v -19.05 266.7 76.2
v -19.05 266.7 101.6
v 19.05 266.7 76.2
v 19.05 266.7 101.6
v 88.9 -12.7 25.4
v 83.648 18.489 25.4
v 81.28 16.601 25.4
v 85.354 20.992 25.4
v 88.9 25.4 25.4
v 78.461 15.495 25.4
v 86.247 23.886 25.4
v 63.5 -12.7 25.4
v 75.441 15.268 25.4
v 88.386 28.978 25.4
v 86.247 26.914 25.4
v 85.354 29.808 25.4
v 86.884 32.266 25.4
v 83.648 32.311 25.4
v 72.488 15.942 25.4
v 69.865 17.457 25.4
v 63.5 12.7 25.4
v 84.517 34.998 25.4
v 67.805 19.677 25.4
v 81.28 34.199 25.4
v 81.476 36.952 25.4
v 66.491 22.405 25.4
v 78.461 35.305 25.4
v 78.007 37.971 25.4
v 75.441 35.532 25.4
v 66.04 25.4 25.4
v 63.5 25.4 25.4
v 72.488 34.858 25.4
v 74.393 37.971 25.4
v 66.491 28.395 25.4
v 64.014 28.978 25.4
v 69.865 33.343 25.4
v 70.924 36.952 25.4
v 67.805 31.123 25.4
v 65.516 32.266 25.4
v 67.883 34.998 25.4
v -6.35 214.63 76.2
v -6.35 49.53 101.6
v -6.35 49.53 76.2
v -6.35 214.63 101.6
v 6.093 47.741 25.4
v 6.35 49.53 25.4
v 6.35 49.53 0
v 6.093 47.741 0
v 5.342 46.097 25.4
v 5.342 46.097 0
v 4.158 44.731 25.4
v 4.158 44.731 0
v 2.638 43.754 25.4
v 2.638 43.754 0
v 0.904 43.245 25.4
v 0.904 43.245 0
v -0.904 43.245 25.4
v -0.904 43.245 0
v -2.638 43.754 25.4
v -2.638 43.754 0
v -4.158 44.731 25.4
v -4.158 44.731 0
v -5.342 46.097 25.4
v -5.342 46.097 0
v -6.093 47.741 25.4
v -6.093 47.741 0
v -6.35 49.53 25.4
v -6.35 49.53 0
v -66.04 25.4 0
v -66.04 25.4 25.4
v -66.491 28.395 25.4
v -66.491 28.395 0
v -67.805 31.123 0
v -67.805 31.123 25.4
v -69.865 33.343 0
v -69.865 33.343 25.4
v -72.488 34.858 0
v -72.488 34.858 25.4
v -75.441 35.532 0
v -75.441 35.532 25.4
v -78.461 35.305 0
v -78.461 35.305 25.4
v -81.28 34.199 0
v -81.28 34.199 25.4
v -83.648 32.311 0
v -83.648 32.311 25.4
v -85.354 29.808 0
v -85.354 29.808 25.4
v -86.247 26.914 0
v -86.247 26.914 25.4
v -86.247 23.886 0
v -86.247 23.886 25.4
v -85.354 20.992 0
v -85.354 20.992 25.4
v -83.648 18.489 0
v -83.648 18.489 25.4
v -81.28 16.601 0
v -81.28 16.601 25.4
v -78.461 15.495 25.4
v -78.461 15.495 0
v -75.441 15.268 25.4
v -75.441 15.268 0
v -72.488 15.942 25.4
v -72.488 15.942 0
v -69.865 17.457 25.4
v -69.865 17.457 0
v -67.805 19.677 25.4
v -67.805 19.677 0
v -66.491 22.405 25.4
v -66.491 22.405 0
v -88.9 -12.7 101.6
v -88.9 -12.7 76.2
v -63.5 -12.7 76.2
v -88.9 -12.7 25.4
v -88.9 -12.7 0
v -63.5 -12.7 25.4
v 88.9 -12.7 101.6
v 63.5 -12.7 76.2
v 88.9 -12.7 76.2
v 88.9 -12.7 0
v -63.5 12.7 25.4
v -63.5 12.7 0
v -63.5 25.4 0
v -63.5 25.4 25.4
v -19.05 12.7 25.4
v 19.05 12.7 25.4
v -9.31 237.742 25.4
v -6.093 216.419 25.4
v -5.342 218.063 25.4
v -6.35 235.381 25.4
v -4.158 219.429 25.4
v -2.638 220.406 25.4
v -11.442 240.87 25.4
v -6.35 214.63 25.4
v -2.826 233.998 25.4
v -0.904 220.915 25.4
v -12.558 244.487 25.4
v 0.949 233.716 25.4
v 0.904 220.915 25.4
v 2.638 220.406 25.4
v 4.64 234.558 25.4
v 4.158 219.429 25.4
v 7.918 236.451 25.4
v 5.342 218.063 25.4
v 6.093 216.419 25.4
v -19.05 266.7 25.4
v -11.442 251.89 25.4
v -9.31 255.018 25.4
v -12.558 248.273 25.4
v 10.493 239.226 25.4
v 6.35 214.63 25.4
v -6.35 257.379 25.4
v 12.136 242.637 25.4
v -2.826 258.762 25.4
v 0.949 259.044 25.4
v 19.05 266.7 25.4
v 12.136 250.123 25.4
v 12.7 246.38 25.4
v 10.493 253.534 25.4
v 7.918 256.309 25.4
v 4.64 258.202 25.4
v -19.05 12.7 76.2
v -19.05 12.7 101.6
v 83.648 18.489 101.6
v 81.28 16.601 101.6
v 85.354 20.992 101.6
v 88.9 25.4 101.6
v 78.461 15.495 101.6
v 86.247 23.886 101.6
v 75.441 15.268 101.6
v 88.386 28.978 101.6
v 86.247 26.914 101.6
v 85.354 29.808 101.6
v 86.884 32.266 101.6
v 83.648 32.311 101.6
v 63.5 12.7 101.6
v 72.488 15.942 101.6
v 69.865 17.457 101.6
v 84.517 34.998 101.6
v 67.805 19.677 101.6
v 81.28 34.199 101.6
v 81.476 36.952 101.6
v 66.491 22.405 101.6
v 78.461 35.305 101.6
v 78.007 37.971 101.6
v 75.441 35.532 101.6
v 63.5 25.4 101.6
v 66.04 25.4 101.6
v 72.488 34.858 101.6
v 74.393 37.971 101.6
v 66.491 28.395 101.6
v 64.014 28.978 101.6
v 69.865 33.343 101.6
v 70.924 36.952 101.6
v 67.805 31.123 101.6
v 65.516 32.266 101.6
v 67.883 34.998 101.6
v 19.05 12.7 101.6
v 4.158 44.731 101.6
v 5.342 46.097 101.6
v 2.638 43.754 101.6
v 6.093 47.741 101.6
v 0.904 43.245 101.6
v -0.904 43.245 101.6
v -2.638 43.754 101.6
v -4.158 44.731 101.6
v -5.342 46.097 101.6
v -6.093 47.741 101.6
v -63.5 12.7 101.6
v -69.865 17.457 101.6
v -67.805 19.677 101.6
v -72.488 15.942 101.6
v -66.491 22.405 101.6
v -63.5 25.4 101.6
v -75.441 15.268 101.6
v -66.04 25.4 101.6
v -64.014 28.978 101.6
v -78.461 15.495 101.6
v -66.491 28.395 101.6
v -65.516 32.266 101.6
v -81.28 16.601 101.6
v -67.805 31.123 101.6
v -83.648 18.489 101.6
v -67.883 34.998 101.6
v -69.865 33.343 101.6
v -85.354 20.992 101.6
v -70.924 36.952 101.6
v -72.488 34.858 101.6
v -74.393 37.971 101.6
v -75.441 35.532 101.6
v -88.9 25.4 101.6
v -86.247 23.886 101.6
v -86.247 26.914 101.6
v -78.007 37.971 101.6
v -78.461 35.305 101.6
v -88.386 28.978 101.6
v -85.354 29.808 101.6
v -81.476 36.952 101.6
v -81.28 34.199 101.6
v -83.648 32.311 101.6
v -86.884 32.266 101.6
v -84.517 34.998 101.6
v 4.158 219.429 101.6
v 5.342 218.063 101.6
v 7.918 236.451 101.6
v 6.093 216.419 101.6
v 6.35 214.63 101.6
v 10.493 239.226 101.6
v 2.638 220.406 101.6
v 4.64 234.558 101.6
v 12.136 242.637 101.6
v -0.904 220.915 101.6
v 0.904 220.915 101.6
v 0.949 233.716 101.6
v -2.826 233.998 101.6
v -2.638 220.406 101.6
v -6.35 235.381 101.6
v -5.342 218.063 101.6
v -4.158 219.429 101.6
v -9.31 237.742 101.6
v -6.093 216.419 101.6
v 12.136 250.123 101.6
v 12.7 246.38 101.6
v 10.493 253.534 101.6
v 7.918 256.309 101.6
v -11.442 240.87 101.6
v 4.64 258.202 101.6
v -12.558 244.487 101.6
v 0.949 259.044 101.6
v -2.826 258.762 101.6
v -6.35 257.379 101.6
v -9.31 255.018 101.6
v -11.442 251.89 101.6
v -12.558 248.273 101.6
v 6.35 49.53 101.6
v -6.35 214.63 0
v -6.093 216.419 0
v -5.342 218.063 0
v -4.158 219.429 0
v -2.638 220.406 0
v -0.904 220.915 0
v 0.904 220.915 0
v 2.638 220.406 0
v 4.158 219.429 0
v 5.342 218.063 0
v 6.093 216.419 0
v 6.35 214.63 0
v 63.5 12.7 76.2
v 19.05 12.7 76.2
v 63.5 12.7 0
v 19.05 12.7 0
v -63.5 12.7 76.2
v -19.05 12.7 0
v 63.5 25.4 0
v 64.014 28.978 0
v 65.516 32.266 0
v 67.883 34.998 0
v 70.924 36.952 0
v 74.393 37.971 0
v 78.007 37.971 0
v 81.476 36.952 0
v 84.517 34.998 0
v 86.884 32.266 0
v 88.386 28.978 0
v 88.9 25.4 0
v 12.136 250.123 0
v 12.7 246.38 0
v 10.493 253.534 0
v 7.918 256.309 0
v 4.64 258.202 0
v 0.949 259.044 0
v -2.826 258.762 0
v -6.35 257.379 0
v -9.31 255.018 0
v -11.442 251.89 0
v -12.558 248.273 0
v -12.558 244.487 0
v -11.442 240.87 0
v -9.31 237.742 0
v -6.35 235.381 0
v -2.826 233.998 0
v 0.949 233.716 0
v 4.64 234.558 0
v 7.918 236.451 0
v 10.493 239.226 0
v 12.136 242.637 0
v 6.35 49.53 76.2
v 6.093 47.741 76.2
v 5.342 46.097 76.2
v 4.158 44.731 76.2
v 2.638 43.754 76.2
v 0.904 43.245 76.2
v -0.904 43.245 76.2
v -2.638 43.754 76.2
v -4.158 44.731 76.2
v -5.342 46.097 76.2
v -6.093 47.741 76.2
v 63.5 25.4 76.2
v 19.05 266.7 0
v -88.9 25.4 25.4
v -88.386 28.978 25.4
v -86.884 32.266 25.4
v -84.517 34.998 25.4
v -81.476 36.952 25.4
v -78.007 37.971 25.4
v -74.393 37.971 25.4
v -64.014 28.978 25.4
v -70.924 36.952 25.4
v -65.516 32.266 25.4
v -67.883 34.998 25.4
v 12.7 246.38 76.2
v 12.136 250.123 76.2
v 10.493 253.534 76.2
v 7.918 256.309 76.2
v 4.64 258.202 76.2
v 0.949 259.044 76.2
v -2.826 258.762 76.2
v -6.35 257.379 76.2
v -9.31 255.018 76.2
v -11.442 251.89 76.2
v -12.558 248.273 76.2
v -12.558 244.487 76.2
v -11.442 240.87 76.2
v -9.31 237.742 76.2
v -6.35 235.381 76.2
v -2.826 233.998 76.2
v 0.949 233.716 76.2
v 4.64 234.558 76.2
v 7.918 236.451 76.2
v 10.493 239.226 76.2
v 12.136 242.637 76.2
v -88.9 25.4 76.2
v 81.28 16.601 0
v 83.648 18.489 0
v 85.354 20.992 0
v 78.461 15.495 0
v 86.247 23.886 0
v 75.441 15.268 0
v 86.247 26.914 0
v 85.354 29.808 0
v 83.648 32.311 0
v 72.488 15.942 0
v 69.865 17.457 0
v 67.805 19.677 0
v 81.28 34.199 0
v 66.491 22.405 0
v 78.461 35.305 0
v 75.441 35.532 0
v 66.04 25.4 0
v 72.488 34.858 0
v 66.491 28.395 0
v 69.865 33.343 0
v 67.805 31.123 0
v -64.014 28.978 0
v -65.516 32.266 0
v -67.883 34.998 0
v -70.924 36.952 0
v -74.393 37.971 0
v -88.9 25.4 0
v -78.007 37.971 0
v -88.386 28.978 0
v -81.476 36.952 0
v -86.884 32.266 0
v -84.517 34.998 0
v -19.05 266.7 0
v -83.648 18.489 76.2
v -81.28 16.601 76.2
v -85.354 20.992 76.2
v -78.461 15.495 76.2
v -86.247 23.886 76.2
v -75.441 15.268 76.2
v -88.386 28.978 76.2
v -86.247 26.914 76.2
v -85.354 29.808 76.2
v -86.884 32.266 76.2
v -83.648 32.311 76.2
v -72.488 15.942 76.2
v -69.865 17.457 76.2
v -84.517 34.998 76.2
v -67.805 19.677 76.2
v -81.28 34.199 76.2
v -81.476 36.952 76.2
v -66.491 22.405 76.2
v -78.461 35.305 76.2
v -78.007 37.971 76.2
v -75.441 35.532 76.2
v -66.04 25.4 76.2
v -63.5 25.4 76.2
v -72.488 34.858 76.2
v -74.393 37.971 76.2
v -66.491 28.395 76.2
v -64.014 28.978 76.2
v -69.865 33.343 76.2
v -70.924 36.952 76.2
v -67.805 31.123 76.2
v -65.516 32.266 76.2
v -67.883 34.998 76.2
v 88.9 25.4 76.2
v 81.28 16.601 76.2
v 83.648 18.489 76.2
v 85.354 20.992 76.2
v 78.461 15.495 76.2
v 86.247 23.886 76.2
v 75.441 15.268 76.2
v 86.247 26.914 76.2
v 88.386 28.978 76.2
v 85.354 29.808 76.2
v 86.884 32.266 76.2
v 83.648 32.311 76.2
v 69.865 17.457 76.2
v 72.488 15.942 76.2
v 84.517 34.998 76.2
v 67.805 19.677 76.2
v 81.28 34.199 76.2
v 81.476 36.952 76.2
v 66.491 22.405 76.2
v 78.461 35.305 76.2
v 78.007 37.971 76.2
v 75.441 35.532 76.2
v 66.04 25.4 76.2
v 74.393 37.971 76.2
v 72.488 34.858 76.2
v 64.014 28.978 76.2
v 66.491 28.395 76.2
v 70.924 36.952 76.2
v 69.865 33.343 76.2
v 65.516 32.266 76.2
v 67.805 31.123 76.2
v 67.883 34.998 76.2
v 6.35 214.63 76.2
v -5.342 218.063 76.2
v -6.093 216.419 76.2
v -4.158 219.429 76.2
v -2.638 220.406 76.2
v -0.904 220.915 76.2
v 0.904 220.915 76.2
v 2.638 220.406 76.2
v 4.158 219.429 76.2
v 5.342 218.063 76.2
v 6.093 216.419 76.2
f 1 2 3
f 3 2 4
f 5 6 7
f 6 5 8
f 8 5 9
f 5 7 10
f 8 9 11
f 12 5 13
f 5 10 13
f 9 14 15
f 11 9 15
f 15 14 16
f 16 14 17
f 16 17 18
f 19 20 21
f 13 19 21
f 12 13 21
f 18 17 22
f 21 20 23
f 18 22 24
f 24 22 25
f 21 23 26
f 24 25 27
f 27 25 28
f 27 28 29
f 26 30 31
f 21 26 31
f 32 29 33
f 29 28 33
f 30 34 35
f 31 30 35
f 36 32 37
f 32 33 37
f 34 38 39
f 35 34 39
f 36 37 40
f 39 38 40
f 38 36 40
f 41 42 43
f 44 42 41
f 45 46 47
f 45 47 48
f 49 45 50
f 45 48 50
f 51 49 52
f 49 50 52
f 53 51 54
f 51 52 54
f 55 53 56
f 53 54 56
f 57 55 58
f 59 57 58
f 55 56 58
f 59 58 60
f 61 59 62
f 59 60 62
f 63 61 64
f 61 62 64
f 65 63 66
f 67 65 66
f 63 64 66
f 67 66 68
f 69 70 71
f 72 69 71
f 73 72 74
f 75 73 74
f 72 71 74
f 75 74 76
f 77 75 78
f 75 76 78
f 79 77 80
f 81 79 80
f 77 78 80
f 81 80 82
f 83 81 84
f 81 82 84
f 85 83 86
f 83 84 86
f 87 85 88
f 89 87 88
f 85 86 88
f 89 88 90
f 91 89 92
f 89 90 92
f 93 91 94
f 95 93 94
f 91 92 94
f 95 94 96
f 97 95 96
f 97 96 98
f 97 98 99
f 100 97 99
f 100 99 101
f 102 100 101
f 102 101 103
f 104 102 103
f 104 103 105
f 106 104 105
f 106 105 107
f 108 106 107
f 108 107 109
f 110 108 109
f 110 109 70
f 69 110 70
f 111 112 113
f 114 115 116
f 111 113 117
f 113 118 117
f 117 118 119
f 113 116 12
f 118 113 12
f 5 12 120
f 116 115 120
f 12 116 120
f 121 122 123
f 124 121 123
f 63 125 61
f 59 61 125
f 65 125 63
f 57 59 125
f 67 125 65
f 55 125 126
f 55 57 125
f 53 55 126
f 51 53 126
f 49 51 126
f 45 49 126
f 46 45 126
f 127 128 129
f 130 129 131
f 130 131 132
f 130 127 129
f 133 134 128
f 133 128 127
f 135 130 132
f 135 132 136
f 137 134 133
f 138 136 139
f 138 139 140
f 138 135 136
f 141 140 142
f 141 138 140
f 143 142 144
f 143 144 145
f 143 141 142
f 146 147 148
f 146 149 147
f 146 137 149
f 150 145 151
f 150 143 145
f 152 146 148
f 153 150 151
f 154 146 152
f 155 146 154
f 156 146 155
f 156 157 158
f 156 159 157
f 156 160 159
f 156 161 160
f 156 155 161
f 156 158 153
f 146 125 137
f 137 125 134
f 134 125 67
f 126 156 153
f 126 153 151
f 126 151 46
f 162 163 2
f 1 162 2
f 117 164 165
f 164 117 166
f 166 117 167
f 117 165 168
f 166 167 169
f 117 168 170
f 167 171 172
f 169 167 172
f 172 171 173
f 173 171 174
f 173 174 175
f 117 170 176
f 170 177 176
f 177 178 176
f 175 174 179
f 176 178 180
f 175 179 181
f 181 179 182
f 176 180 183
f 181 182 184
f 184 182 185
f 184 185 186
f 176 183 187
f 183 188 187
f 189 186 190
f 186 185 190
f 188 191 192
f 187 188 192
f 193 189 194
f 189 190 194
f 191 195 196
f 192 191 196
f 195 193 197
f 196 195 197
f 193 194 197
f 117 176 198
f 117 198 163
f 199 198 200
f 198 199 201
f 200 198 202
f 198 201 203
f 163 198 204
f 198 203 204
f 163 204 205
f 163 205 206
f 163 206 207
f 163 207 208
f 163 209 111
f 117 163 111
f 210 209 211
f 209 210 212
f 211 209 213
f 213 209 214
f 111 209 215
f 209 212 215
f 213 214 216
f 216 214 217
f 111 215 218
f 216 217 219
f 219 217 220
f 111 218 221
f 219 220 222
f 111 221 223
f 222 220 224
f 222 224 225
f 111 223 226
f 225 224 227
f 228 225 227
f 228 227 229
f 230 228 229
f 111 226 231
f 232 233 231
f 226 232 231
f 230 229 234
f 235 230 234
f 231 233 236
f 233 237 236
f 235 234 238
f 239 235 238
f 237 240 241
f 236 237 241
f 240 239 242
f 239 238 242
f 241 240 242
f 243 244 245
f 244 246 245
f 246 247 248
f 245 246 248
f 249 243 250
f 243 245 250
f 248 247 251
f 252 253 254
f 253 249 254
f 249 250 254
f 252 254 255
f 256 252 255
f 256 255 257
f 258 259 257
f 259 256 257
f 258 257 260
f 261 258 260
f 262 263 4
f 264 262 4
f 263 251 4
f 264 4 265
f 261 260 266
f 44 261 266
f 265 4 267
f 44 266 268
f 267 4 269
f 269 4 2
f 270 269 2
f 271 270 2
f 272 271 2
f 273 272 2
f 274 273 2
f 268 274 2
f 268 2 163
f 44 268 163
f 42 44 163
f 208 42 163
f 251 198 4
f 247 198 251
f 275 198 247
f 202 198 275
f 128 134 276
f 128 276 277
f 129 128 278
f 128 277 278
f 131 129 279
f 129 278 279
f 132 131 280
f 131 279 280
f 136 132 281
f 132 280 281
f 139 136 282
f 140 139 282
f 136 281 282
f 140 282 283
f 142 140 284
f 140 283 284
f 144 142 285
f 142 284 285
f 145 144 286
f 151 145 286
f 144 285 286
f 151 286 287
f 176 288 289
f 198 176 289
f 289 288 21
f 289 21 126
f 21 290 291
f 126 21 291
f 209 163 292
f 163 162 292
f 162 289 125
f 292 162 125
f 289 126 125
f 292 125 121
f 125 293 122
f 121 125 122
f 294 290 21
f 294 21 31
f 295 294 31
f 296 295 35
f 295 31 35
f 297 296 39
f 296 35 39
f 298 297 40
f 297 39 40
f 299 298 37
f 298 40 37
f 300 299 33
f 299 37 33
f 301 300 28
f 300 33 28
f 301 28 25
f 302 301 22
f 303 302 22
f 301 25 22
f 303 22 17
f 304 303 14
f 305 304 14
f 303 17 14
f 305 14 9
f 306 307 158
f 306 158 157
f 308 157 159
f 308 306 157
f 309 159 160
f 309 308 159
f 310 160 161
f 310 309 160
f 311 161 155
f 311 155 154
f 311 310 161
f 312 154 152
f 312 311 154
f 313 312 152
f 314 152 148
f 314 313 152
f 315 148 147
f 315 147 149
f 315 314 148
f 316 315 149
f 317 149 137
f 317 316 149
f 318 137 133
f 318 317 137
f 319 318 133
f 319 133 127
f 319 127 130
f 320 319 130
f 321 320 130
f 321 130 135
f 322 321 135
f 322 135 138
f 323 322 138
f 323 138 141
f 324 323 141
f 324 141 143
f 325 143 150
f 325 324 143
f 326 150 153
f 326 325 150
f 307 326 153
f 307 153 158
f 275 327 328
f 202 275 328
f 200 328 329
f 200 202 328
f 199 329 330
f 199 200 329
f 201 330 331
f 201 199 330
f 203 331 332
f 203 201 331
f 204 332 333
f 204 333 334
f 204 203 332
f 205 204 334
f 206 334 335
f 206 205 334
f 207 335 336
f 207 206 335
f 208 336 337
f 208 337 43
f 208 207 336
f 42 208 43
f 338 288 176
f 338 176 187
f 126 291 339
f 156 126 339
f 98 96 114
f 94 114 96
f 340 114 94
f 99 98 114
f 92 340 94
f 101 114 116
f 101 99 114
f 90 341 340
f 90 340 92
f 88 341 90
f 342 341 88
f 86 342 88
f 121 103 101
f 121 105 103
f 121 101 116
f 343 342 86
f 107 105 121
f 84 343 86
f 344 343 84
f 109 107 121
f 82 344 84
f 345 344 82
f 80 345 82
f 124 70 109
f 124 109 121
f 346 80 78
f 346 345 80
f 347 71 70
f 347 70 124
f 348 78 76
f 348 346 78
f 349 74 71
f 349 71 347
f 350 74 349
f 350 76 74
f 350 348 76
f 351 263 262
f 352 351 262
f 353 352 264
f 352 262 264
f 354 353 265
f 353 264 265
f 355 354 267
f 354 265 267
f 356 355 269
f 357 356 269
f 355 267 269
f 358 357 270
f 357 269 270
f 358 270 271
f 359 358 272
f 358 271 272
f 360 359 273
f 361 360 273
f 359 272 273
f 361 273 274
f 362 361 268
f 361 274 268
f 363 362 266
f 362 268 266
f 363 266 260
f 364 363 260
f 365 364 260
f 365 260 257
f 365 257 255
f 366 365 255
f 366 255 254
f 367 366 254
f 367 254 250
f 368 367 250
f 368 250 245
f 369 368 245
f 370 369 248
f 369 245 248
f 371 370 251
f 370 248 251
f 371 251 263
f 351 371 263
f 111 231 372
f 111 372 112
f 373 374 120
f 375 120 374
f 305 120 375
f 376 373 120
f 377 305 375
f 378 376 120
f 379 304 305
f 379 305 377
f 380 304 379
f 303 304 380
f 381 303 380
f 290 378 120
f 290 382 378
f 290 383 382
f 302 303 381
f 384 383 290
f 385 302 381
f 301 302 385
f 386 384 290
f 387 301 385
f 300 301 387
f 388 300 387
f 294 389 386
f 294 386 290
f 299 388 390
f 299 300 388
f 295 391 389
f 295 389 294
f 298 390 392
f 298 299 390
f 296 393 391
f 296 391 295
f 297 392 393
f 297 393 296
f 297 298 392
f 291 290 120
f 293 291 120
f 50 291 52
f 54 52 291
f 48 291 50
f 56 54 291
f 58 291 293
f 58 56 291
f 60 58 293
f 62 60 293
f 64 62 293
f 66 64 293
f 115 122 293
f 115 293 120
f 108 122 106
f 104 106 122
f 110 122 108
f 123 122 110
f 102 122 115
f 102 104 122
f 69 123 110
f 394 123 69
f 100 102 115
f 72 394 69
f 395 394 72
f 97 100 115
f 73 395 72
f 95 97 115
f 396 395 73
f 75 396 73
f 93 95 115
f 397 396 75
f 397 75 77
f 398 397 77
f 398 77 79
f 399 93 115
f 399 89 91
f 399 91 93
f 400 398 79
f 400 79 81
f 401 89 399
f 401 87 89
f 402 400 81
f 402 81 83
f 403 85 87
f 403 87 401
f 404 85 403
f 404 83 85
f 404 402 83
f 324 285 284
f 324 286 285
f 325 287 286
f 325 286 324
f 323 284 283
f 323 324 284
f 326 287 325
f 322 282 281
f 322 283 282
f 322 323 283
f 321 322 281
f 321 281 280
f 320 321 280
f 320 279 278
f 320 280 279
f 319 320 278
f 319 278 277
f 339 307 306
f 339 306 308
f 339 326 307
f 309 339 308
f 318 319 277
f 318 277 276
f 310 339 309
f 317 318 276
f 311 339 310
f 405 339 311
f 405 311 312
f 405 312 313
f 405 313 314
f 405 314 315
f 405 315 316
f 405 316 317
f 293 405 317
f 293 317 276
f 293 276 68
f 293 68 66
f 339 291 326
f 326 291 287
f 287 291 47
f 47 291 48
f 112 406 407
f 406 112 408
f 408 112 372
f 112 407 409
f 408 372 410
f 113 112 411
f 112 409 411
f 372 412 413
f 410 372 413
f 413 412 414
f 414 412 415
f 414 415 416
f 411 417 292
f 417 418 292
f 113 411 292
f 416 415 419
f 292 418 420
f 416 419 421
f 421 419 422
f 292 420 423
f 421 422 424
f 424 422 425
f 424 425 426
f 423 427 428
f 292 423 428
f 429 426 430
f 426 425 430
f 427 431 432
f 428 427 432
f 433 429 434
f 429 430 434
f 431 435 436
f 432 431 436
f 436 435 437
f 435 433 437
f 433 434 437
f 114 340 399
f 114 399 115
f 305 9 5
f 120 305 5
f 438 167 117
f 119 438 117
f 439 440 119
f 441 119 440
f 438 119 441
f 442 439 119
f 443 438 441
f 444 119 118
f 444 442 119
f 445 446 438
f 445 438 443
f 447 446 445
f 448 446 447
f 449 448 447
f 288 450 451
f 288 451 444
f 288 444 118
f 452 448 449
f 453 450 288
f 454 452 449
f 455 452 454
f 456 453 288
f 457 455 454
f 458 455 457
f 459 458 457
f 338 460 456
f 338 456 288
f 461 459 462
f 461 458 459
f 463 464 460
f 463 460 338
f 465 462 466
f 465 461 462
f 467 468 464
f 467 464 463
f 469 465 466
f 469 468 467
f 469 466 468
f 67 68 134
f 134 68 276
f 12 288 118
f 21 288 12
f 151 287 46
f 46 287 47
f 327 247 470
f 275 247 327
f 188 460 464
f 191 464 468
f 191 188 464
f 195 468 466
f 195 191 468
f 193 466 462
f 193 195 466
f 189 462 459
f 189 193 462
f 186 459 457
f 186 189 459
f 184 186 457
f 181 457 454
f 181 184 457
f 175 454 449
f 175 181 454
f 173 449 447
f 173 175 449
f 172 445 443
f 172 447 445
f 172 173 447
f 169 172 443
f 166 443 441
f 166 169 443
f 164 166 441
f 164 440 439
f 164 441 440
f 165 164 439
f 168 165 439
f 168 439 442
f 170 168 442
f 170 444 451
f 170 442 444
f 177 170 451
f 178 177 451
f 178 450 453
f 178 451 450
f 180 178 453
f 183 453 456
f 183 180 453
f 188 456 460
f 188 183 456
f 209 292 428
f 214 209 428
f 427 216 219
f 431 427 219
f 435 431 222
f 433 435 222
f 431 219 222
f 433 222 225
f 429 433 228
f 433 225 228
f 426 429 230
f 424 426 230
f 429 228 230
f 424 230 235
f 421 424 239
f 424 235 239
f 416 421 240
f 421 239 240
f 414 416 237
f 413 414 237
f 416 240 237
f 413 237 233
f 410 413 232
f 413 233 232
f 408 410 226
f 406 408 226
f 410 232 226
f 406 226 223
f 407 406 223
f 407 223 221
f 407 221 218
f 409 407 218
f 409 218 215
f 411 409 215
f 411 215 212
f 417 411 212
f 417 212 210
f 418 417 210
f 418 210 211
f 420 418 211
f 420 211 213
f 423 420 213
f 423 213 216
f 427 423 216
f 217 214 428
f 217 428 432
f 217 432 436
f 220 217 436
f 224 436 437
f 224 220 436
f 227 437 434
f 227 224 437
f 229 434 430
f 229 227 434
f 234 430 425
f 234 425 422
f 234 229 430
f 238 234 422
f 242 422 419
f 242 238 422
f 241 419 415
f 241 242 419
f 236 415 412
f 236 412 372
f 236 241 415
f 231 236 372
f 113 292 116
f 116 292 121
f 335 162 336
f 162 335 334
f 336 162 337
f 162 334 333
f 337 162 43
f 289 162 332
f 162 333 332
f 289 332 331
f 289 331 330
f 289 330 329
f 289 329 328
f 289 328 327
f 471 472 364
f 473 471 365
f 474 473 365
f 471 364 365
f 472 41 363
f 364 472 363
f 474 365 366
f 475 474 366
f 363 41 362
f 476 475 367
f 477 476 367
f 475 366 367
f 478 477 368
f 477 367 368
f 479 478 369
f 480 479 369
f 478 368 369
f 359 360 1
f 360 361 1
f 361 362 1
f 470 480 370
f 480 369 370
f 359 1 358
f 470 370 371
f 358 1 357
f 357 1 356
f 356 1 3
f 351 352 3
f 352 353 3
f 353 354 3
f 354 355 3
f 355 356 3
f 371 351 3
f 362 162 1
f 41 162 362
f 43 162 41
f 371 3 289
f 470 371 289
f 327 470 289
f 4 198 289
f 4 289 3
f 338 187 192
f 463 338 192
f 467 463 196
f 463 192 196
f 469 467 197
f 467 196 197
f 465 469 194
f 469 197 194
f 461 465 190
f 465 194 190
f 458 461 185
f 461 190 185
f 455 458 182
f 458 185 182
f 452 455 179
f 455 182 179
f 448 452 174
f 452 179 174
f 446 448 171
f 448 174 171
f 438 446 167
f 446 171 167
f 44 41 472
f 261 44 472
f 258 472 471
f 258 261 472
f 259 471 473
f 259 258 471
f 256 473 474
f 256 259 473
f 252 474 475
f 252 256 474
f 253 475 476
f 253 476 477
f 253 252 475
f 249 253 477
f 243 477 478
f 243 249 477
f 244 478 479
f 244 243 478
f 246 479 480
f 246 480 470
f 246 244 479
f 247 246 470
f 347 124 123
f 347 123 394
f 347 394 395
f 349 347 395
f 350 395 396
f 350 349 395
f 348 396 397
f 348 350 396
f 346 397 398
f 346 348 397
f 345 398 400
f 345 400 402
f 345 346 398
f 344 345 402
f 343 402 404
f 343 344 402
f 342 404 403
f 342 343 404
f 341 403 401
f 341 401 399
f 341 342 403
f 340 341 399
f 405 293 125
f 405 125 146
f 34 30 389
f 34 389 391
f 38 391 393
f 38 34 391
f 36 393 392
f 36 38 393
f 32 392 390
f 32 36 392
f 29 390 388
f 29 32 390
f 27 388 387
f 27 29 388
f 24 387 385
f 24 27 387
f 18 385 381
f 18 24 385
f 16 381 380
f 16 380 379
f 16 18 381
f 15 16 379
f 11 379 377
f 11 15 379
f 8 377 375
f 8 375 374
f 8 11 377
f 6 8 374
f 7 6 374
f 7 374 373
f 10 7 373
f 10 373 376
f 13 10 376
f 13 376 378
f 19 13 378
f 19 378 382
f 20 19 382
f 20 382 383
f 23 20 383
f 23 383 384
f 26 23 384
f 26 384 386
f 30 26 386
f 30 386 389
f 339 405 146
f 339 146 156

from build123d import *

# Parameters (mm, degrees)
SKETCH1_W           = 38.1
SKETCH1_H           = 254
SKETCH1_R           = 12.7
BOSS_EXTRUDE1_DEPTH = 25.4
SKETCH1_4_W         = 177.8
SKETCH1_4_H         = 25.4
BOSS_EXTRUDE2_DEPTH = 101.6
BOSS_EXTRUDE3_START = 101.6
SKETCH1_5_W         = 38.1
SKETCH1_5_H         = 254
SKETCH1_5_R         = 12.7
BOSS_EXTRUDE3_DEPTH = 25.4
SKETCH2_R           = 12.7
SKETCH2_R_2         = 10.16
BOSS_EXTRUDE4_DEPTH = 101.6
SKETCH3_W           = 25.4
SKETCH3_H           = 50.8
CUT_EXTRUDE1_DEPTH  = 288.648691984


with BuildPart() as part:
    # Sketch1 → Boss-Extrude1 (new body)
    with BuildSketch(Plane.XY):
        Polygon((-88.9, -12.7), (88.9, -12.7), (88.9, 12.7), (19.05, 12.7), (-19.05, 12.7), (-88.9, 12.7), align=None)
        with Locations((0, 139.7)):
            Rectangle(SKETCH1_W, SKETCH1_H)
        with BuildLine():
            ThreePointArc((6.35, 49.53), (0, 43.18), (-6.35, 49.53))
            Line((-6.35, 49.53), (-6.35, 214.63))
            ThreePointArc((-6.35, 214.63), (0, 220.98), (6.35, 214.63))
            Line((6.35, 214.63), (6.35, 49.53))
        make_face(mode=Mode.SUBTRACT)
        with Locations((0, 246.38)):
            Circle(SKETCH1_R, mode=Mode.SUBTRACT)
    extrude(amount=BOSS_EXTRUDE1_DEPTH)

    # Sketch1<4> → Boss-Extrude2 (add)
    with BuildSketch(Plane.XY):
        Rectangle(SKETCH1_4_W, SKETCH1_4_H)
    extrude(amount=BOSS_EXTRUDE2_DEPTH)

    # Sketch1<5> → Boss-Extrude3 (add)
    with BuildSketch(Plane.XY.offset(BOSS_EXTRUDE3_START)):
        Polygon((-88.9, -12.7), (88.9, -12.7), (88.9, 12.7), (19.05, 12.7), (-19.05, 12.7), (-88.9, 12.7), align=None)
        with Locations((0, 139.7)):
            Rectangle(SKETCH1_5_W, SKETCH1_5_H)
        with BuildLine():
            ThreePointArc((6.35, 49.53), (0, 43.18), (-6.35, 49.53))
            Line((-6.35, 49.53), (-6.35, 214.63))
            ThreePointArc((-6.35, 214.63), (0, 220.98), (6.35, 214.63))
            Line((6.35, 214.63), (6.35, 49.53))
        make_face(mode=Mode.SUBTRACT)
        with Locations((0, 246.38)):
            Circle(SKETCH1_5_R, mode=Mode.SUBTRACT)
    extrude(amount=-BOSS_EXTRUDE3_DEPTH)

    # Sketch2 → Boss-Extrude4 (add, through all)
    with BuildSketch(Plane.XY.offset(101.6)):
        with Locations((-76.2, 25.4)):
            Circle(SKETCH2_R)
        with Locations((-76.2, 25.4)):
            Circle(SKETCH2_R_2, mode=Mode.SUBTRACT)
        with BuildLine():
            ThreePointArc((-76.199999961, 12.7), (-85.180256107, 16.419743865), (-88.9, 25.4))
            Line((-88.9, 25.4), (-88.9, 12.7))
            Line((-88.9, 12.7), (-76.199999961, 12.7))
        make_face()
        with BuildLine():
            Line((-63.5, 12.7), (-63.5, 25.4))
            ThreePointArc((-63.5, 25.4), (-67.219743865, 16.419743893), (-76.199999961, 12.7))
            Line((-76.199999961, 12.7), (-63.5, 12.7))
        make_face()
    boss_extrude4 = extrude(amount=-BOSS_EXTRUDE4_DEPTH)

    # Sketch3 → Cut-Extrude1 (cut, symmetric)
    with BuildSketch(Plane(origin=(0, 12.7, 0), x_dir=(1, 0, 0), z_dir=(0, 1, 0))):
        with Locations((-76.2, -50.8)):
            Rectangle(SKETCH3_W, SKETCH3_H)
    cut_extrude1 = extrude(amount=CUT_EXTRUDE1_DEPTH, both=True, mode=Mode.SUBTRACT)

    # Mirror1: Boss-Extrude4, Cut-Extrude1 across plane
    add(boss_extrude4.mirror(Plane(origin=(0, 0, 0), x_dir=(0, 0, 1), z_dir=(1, 0, 0))))
    add(cut_extrude1.mirror(Plane(origin=(0, 0, 0), x_dir=(0, 0, 1), z_dir=(1, 0, 0))), mode=Mode.SUBTRACT)


solid = part.part
